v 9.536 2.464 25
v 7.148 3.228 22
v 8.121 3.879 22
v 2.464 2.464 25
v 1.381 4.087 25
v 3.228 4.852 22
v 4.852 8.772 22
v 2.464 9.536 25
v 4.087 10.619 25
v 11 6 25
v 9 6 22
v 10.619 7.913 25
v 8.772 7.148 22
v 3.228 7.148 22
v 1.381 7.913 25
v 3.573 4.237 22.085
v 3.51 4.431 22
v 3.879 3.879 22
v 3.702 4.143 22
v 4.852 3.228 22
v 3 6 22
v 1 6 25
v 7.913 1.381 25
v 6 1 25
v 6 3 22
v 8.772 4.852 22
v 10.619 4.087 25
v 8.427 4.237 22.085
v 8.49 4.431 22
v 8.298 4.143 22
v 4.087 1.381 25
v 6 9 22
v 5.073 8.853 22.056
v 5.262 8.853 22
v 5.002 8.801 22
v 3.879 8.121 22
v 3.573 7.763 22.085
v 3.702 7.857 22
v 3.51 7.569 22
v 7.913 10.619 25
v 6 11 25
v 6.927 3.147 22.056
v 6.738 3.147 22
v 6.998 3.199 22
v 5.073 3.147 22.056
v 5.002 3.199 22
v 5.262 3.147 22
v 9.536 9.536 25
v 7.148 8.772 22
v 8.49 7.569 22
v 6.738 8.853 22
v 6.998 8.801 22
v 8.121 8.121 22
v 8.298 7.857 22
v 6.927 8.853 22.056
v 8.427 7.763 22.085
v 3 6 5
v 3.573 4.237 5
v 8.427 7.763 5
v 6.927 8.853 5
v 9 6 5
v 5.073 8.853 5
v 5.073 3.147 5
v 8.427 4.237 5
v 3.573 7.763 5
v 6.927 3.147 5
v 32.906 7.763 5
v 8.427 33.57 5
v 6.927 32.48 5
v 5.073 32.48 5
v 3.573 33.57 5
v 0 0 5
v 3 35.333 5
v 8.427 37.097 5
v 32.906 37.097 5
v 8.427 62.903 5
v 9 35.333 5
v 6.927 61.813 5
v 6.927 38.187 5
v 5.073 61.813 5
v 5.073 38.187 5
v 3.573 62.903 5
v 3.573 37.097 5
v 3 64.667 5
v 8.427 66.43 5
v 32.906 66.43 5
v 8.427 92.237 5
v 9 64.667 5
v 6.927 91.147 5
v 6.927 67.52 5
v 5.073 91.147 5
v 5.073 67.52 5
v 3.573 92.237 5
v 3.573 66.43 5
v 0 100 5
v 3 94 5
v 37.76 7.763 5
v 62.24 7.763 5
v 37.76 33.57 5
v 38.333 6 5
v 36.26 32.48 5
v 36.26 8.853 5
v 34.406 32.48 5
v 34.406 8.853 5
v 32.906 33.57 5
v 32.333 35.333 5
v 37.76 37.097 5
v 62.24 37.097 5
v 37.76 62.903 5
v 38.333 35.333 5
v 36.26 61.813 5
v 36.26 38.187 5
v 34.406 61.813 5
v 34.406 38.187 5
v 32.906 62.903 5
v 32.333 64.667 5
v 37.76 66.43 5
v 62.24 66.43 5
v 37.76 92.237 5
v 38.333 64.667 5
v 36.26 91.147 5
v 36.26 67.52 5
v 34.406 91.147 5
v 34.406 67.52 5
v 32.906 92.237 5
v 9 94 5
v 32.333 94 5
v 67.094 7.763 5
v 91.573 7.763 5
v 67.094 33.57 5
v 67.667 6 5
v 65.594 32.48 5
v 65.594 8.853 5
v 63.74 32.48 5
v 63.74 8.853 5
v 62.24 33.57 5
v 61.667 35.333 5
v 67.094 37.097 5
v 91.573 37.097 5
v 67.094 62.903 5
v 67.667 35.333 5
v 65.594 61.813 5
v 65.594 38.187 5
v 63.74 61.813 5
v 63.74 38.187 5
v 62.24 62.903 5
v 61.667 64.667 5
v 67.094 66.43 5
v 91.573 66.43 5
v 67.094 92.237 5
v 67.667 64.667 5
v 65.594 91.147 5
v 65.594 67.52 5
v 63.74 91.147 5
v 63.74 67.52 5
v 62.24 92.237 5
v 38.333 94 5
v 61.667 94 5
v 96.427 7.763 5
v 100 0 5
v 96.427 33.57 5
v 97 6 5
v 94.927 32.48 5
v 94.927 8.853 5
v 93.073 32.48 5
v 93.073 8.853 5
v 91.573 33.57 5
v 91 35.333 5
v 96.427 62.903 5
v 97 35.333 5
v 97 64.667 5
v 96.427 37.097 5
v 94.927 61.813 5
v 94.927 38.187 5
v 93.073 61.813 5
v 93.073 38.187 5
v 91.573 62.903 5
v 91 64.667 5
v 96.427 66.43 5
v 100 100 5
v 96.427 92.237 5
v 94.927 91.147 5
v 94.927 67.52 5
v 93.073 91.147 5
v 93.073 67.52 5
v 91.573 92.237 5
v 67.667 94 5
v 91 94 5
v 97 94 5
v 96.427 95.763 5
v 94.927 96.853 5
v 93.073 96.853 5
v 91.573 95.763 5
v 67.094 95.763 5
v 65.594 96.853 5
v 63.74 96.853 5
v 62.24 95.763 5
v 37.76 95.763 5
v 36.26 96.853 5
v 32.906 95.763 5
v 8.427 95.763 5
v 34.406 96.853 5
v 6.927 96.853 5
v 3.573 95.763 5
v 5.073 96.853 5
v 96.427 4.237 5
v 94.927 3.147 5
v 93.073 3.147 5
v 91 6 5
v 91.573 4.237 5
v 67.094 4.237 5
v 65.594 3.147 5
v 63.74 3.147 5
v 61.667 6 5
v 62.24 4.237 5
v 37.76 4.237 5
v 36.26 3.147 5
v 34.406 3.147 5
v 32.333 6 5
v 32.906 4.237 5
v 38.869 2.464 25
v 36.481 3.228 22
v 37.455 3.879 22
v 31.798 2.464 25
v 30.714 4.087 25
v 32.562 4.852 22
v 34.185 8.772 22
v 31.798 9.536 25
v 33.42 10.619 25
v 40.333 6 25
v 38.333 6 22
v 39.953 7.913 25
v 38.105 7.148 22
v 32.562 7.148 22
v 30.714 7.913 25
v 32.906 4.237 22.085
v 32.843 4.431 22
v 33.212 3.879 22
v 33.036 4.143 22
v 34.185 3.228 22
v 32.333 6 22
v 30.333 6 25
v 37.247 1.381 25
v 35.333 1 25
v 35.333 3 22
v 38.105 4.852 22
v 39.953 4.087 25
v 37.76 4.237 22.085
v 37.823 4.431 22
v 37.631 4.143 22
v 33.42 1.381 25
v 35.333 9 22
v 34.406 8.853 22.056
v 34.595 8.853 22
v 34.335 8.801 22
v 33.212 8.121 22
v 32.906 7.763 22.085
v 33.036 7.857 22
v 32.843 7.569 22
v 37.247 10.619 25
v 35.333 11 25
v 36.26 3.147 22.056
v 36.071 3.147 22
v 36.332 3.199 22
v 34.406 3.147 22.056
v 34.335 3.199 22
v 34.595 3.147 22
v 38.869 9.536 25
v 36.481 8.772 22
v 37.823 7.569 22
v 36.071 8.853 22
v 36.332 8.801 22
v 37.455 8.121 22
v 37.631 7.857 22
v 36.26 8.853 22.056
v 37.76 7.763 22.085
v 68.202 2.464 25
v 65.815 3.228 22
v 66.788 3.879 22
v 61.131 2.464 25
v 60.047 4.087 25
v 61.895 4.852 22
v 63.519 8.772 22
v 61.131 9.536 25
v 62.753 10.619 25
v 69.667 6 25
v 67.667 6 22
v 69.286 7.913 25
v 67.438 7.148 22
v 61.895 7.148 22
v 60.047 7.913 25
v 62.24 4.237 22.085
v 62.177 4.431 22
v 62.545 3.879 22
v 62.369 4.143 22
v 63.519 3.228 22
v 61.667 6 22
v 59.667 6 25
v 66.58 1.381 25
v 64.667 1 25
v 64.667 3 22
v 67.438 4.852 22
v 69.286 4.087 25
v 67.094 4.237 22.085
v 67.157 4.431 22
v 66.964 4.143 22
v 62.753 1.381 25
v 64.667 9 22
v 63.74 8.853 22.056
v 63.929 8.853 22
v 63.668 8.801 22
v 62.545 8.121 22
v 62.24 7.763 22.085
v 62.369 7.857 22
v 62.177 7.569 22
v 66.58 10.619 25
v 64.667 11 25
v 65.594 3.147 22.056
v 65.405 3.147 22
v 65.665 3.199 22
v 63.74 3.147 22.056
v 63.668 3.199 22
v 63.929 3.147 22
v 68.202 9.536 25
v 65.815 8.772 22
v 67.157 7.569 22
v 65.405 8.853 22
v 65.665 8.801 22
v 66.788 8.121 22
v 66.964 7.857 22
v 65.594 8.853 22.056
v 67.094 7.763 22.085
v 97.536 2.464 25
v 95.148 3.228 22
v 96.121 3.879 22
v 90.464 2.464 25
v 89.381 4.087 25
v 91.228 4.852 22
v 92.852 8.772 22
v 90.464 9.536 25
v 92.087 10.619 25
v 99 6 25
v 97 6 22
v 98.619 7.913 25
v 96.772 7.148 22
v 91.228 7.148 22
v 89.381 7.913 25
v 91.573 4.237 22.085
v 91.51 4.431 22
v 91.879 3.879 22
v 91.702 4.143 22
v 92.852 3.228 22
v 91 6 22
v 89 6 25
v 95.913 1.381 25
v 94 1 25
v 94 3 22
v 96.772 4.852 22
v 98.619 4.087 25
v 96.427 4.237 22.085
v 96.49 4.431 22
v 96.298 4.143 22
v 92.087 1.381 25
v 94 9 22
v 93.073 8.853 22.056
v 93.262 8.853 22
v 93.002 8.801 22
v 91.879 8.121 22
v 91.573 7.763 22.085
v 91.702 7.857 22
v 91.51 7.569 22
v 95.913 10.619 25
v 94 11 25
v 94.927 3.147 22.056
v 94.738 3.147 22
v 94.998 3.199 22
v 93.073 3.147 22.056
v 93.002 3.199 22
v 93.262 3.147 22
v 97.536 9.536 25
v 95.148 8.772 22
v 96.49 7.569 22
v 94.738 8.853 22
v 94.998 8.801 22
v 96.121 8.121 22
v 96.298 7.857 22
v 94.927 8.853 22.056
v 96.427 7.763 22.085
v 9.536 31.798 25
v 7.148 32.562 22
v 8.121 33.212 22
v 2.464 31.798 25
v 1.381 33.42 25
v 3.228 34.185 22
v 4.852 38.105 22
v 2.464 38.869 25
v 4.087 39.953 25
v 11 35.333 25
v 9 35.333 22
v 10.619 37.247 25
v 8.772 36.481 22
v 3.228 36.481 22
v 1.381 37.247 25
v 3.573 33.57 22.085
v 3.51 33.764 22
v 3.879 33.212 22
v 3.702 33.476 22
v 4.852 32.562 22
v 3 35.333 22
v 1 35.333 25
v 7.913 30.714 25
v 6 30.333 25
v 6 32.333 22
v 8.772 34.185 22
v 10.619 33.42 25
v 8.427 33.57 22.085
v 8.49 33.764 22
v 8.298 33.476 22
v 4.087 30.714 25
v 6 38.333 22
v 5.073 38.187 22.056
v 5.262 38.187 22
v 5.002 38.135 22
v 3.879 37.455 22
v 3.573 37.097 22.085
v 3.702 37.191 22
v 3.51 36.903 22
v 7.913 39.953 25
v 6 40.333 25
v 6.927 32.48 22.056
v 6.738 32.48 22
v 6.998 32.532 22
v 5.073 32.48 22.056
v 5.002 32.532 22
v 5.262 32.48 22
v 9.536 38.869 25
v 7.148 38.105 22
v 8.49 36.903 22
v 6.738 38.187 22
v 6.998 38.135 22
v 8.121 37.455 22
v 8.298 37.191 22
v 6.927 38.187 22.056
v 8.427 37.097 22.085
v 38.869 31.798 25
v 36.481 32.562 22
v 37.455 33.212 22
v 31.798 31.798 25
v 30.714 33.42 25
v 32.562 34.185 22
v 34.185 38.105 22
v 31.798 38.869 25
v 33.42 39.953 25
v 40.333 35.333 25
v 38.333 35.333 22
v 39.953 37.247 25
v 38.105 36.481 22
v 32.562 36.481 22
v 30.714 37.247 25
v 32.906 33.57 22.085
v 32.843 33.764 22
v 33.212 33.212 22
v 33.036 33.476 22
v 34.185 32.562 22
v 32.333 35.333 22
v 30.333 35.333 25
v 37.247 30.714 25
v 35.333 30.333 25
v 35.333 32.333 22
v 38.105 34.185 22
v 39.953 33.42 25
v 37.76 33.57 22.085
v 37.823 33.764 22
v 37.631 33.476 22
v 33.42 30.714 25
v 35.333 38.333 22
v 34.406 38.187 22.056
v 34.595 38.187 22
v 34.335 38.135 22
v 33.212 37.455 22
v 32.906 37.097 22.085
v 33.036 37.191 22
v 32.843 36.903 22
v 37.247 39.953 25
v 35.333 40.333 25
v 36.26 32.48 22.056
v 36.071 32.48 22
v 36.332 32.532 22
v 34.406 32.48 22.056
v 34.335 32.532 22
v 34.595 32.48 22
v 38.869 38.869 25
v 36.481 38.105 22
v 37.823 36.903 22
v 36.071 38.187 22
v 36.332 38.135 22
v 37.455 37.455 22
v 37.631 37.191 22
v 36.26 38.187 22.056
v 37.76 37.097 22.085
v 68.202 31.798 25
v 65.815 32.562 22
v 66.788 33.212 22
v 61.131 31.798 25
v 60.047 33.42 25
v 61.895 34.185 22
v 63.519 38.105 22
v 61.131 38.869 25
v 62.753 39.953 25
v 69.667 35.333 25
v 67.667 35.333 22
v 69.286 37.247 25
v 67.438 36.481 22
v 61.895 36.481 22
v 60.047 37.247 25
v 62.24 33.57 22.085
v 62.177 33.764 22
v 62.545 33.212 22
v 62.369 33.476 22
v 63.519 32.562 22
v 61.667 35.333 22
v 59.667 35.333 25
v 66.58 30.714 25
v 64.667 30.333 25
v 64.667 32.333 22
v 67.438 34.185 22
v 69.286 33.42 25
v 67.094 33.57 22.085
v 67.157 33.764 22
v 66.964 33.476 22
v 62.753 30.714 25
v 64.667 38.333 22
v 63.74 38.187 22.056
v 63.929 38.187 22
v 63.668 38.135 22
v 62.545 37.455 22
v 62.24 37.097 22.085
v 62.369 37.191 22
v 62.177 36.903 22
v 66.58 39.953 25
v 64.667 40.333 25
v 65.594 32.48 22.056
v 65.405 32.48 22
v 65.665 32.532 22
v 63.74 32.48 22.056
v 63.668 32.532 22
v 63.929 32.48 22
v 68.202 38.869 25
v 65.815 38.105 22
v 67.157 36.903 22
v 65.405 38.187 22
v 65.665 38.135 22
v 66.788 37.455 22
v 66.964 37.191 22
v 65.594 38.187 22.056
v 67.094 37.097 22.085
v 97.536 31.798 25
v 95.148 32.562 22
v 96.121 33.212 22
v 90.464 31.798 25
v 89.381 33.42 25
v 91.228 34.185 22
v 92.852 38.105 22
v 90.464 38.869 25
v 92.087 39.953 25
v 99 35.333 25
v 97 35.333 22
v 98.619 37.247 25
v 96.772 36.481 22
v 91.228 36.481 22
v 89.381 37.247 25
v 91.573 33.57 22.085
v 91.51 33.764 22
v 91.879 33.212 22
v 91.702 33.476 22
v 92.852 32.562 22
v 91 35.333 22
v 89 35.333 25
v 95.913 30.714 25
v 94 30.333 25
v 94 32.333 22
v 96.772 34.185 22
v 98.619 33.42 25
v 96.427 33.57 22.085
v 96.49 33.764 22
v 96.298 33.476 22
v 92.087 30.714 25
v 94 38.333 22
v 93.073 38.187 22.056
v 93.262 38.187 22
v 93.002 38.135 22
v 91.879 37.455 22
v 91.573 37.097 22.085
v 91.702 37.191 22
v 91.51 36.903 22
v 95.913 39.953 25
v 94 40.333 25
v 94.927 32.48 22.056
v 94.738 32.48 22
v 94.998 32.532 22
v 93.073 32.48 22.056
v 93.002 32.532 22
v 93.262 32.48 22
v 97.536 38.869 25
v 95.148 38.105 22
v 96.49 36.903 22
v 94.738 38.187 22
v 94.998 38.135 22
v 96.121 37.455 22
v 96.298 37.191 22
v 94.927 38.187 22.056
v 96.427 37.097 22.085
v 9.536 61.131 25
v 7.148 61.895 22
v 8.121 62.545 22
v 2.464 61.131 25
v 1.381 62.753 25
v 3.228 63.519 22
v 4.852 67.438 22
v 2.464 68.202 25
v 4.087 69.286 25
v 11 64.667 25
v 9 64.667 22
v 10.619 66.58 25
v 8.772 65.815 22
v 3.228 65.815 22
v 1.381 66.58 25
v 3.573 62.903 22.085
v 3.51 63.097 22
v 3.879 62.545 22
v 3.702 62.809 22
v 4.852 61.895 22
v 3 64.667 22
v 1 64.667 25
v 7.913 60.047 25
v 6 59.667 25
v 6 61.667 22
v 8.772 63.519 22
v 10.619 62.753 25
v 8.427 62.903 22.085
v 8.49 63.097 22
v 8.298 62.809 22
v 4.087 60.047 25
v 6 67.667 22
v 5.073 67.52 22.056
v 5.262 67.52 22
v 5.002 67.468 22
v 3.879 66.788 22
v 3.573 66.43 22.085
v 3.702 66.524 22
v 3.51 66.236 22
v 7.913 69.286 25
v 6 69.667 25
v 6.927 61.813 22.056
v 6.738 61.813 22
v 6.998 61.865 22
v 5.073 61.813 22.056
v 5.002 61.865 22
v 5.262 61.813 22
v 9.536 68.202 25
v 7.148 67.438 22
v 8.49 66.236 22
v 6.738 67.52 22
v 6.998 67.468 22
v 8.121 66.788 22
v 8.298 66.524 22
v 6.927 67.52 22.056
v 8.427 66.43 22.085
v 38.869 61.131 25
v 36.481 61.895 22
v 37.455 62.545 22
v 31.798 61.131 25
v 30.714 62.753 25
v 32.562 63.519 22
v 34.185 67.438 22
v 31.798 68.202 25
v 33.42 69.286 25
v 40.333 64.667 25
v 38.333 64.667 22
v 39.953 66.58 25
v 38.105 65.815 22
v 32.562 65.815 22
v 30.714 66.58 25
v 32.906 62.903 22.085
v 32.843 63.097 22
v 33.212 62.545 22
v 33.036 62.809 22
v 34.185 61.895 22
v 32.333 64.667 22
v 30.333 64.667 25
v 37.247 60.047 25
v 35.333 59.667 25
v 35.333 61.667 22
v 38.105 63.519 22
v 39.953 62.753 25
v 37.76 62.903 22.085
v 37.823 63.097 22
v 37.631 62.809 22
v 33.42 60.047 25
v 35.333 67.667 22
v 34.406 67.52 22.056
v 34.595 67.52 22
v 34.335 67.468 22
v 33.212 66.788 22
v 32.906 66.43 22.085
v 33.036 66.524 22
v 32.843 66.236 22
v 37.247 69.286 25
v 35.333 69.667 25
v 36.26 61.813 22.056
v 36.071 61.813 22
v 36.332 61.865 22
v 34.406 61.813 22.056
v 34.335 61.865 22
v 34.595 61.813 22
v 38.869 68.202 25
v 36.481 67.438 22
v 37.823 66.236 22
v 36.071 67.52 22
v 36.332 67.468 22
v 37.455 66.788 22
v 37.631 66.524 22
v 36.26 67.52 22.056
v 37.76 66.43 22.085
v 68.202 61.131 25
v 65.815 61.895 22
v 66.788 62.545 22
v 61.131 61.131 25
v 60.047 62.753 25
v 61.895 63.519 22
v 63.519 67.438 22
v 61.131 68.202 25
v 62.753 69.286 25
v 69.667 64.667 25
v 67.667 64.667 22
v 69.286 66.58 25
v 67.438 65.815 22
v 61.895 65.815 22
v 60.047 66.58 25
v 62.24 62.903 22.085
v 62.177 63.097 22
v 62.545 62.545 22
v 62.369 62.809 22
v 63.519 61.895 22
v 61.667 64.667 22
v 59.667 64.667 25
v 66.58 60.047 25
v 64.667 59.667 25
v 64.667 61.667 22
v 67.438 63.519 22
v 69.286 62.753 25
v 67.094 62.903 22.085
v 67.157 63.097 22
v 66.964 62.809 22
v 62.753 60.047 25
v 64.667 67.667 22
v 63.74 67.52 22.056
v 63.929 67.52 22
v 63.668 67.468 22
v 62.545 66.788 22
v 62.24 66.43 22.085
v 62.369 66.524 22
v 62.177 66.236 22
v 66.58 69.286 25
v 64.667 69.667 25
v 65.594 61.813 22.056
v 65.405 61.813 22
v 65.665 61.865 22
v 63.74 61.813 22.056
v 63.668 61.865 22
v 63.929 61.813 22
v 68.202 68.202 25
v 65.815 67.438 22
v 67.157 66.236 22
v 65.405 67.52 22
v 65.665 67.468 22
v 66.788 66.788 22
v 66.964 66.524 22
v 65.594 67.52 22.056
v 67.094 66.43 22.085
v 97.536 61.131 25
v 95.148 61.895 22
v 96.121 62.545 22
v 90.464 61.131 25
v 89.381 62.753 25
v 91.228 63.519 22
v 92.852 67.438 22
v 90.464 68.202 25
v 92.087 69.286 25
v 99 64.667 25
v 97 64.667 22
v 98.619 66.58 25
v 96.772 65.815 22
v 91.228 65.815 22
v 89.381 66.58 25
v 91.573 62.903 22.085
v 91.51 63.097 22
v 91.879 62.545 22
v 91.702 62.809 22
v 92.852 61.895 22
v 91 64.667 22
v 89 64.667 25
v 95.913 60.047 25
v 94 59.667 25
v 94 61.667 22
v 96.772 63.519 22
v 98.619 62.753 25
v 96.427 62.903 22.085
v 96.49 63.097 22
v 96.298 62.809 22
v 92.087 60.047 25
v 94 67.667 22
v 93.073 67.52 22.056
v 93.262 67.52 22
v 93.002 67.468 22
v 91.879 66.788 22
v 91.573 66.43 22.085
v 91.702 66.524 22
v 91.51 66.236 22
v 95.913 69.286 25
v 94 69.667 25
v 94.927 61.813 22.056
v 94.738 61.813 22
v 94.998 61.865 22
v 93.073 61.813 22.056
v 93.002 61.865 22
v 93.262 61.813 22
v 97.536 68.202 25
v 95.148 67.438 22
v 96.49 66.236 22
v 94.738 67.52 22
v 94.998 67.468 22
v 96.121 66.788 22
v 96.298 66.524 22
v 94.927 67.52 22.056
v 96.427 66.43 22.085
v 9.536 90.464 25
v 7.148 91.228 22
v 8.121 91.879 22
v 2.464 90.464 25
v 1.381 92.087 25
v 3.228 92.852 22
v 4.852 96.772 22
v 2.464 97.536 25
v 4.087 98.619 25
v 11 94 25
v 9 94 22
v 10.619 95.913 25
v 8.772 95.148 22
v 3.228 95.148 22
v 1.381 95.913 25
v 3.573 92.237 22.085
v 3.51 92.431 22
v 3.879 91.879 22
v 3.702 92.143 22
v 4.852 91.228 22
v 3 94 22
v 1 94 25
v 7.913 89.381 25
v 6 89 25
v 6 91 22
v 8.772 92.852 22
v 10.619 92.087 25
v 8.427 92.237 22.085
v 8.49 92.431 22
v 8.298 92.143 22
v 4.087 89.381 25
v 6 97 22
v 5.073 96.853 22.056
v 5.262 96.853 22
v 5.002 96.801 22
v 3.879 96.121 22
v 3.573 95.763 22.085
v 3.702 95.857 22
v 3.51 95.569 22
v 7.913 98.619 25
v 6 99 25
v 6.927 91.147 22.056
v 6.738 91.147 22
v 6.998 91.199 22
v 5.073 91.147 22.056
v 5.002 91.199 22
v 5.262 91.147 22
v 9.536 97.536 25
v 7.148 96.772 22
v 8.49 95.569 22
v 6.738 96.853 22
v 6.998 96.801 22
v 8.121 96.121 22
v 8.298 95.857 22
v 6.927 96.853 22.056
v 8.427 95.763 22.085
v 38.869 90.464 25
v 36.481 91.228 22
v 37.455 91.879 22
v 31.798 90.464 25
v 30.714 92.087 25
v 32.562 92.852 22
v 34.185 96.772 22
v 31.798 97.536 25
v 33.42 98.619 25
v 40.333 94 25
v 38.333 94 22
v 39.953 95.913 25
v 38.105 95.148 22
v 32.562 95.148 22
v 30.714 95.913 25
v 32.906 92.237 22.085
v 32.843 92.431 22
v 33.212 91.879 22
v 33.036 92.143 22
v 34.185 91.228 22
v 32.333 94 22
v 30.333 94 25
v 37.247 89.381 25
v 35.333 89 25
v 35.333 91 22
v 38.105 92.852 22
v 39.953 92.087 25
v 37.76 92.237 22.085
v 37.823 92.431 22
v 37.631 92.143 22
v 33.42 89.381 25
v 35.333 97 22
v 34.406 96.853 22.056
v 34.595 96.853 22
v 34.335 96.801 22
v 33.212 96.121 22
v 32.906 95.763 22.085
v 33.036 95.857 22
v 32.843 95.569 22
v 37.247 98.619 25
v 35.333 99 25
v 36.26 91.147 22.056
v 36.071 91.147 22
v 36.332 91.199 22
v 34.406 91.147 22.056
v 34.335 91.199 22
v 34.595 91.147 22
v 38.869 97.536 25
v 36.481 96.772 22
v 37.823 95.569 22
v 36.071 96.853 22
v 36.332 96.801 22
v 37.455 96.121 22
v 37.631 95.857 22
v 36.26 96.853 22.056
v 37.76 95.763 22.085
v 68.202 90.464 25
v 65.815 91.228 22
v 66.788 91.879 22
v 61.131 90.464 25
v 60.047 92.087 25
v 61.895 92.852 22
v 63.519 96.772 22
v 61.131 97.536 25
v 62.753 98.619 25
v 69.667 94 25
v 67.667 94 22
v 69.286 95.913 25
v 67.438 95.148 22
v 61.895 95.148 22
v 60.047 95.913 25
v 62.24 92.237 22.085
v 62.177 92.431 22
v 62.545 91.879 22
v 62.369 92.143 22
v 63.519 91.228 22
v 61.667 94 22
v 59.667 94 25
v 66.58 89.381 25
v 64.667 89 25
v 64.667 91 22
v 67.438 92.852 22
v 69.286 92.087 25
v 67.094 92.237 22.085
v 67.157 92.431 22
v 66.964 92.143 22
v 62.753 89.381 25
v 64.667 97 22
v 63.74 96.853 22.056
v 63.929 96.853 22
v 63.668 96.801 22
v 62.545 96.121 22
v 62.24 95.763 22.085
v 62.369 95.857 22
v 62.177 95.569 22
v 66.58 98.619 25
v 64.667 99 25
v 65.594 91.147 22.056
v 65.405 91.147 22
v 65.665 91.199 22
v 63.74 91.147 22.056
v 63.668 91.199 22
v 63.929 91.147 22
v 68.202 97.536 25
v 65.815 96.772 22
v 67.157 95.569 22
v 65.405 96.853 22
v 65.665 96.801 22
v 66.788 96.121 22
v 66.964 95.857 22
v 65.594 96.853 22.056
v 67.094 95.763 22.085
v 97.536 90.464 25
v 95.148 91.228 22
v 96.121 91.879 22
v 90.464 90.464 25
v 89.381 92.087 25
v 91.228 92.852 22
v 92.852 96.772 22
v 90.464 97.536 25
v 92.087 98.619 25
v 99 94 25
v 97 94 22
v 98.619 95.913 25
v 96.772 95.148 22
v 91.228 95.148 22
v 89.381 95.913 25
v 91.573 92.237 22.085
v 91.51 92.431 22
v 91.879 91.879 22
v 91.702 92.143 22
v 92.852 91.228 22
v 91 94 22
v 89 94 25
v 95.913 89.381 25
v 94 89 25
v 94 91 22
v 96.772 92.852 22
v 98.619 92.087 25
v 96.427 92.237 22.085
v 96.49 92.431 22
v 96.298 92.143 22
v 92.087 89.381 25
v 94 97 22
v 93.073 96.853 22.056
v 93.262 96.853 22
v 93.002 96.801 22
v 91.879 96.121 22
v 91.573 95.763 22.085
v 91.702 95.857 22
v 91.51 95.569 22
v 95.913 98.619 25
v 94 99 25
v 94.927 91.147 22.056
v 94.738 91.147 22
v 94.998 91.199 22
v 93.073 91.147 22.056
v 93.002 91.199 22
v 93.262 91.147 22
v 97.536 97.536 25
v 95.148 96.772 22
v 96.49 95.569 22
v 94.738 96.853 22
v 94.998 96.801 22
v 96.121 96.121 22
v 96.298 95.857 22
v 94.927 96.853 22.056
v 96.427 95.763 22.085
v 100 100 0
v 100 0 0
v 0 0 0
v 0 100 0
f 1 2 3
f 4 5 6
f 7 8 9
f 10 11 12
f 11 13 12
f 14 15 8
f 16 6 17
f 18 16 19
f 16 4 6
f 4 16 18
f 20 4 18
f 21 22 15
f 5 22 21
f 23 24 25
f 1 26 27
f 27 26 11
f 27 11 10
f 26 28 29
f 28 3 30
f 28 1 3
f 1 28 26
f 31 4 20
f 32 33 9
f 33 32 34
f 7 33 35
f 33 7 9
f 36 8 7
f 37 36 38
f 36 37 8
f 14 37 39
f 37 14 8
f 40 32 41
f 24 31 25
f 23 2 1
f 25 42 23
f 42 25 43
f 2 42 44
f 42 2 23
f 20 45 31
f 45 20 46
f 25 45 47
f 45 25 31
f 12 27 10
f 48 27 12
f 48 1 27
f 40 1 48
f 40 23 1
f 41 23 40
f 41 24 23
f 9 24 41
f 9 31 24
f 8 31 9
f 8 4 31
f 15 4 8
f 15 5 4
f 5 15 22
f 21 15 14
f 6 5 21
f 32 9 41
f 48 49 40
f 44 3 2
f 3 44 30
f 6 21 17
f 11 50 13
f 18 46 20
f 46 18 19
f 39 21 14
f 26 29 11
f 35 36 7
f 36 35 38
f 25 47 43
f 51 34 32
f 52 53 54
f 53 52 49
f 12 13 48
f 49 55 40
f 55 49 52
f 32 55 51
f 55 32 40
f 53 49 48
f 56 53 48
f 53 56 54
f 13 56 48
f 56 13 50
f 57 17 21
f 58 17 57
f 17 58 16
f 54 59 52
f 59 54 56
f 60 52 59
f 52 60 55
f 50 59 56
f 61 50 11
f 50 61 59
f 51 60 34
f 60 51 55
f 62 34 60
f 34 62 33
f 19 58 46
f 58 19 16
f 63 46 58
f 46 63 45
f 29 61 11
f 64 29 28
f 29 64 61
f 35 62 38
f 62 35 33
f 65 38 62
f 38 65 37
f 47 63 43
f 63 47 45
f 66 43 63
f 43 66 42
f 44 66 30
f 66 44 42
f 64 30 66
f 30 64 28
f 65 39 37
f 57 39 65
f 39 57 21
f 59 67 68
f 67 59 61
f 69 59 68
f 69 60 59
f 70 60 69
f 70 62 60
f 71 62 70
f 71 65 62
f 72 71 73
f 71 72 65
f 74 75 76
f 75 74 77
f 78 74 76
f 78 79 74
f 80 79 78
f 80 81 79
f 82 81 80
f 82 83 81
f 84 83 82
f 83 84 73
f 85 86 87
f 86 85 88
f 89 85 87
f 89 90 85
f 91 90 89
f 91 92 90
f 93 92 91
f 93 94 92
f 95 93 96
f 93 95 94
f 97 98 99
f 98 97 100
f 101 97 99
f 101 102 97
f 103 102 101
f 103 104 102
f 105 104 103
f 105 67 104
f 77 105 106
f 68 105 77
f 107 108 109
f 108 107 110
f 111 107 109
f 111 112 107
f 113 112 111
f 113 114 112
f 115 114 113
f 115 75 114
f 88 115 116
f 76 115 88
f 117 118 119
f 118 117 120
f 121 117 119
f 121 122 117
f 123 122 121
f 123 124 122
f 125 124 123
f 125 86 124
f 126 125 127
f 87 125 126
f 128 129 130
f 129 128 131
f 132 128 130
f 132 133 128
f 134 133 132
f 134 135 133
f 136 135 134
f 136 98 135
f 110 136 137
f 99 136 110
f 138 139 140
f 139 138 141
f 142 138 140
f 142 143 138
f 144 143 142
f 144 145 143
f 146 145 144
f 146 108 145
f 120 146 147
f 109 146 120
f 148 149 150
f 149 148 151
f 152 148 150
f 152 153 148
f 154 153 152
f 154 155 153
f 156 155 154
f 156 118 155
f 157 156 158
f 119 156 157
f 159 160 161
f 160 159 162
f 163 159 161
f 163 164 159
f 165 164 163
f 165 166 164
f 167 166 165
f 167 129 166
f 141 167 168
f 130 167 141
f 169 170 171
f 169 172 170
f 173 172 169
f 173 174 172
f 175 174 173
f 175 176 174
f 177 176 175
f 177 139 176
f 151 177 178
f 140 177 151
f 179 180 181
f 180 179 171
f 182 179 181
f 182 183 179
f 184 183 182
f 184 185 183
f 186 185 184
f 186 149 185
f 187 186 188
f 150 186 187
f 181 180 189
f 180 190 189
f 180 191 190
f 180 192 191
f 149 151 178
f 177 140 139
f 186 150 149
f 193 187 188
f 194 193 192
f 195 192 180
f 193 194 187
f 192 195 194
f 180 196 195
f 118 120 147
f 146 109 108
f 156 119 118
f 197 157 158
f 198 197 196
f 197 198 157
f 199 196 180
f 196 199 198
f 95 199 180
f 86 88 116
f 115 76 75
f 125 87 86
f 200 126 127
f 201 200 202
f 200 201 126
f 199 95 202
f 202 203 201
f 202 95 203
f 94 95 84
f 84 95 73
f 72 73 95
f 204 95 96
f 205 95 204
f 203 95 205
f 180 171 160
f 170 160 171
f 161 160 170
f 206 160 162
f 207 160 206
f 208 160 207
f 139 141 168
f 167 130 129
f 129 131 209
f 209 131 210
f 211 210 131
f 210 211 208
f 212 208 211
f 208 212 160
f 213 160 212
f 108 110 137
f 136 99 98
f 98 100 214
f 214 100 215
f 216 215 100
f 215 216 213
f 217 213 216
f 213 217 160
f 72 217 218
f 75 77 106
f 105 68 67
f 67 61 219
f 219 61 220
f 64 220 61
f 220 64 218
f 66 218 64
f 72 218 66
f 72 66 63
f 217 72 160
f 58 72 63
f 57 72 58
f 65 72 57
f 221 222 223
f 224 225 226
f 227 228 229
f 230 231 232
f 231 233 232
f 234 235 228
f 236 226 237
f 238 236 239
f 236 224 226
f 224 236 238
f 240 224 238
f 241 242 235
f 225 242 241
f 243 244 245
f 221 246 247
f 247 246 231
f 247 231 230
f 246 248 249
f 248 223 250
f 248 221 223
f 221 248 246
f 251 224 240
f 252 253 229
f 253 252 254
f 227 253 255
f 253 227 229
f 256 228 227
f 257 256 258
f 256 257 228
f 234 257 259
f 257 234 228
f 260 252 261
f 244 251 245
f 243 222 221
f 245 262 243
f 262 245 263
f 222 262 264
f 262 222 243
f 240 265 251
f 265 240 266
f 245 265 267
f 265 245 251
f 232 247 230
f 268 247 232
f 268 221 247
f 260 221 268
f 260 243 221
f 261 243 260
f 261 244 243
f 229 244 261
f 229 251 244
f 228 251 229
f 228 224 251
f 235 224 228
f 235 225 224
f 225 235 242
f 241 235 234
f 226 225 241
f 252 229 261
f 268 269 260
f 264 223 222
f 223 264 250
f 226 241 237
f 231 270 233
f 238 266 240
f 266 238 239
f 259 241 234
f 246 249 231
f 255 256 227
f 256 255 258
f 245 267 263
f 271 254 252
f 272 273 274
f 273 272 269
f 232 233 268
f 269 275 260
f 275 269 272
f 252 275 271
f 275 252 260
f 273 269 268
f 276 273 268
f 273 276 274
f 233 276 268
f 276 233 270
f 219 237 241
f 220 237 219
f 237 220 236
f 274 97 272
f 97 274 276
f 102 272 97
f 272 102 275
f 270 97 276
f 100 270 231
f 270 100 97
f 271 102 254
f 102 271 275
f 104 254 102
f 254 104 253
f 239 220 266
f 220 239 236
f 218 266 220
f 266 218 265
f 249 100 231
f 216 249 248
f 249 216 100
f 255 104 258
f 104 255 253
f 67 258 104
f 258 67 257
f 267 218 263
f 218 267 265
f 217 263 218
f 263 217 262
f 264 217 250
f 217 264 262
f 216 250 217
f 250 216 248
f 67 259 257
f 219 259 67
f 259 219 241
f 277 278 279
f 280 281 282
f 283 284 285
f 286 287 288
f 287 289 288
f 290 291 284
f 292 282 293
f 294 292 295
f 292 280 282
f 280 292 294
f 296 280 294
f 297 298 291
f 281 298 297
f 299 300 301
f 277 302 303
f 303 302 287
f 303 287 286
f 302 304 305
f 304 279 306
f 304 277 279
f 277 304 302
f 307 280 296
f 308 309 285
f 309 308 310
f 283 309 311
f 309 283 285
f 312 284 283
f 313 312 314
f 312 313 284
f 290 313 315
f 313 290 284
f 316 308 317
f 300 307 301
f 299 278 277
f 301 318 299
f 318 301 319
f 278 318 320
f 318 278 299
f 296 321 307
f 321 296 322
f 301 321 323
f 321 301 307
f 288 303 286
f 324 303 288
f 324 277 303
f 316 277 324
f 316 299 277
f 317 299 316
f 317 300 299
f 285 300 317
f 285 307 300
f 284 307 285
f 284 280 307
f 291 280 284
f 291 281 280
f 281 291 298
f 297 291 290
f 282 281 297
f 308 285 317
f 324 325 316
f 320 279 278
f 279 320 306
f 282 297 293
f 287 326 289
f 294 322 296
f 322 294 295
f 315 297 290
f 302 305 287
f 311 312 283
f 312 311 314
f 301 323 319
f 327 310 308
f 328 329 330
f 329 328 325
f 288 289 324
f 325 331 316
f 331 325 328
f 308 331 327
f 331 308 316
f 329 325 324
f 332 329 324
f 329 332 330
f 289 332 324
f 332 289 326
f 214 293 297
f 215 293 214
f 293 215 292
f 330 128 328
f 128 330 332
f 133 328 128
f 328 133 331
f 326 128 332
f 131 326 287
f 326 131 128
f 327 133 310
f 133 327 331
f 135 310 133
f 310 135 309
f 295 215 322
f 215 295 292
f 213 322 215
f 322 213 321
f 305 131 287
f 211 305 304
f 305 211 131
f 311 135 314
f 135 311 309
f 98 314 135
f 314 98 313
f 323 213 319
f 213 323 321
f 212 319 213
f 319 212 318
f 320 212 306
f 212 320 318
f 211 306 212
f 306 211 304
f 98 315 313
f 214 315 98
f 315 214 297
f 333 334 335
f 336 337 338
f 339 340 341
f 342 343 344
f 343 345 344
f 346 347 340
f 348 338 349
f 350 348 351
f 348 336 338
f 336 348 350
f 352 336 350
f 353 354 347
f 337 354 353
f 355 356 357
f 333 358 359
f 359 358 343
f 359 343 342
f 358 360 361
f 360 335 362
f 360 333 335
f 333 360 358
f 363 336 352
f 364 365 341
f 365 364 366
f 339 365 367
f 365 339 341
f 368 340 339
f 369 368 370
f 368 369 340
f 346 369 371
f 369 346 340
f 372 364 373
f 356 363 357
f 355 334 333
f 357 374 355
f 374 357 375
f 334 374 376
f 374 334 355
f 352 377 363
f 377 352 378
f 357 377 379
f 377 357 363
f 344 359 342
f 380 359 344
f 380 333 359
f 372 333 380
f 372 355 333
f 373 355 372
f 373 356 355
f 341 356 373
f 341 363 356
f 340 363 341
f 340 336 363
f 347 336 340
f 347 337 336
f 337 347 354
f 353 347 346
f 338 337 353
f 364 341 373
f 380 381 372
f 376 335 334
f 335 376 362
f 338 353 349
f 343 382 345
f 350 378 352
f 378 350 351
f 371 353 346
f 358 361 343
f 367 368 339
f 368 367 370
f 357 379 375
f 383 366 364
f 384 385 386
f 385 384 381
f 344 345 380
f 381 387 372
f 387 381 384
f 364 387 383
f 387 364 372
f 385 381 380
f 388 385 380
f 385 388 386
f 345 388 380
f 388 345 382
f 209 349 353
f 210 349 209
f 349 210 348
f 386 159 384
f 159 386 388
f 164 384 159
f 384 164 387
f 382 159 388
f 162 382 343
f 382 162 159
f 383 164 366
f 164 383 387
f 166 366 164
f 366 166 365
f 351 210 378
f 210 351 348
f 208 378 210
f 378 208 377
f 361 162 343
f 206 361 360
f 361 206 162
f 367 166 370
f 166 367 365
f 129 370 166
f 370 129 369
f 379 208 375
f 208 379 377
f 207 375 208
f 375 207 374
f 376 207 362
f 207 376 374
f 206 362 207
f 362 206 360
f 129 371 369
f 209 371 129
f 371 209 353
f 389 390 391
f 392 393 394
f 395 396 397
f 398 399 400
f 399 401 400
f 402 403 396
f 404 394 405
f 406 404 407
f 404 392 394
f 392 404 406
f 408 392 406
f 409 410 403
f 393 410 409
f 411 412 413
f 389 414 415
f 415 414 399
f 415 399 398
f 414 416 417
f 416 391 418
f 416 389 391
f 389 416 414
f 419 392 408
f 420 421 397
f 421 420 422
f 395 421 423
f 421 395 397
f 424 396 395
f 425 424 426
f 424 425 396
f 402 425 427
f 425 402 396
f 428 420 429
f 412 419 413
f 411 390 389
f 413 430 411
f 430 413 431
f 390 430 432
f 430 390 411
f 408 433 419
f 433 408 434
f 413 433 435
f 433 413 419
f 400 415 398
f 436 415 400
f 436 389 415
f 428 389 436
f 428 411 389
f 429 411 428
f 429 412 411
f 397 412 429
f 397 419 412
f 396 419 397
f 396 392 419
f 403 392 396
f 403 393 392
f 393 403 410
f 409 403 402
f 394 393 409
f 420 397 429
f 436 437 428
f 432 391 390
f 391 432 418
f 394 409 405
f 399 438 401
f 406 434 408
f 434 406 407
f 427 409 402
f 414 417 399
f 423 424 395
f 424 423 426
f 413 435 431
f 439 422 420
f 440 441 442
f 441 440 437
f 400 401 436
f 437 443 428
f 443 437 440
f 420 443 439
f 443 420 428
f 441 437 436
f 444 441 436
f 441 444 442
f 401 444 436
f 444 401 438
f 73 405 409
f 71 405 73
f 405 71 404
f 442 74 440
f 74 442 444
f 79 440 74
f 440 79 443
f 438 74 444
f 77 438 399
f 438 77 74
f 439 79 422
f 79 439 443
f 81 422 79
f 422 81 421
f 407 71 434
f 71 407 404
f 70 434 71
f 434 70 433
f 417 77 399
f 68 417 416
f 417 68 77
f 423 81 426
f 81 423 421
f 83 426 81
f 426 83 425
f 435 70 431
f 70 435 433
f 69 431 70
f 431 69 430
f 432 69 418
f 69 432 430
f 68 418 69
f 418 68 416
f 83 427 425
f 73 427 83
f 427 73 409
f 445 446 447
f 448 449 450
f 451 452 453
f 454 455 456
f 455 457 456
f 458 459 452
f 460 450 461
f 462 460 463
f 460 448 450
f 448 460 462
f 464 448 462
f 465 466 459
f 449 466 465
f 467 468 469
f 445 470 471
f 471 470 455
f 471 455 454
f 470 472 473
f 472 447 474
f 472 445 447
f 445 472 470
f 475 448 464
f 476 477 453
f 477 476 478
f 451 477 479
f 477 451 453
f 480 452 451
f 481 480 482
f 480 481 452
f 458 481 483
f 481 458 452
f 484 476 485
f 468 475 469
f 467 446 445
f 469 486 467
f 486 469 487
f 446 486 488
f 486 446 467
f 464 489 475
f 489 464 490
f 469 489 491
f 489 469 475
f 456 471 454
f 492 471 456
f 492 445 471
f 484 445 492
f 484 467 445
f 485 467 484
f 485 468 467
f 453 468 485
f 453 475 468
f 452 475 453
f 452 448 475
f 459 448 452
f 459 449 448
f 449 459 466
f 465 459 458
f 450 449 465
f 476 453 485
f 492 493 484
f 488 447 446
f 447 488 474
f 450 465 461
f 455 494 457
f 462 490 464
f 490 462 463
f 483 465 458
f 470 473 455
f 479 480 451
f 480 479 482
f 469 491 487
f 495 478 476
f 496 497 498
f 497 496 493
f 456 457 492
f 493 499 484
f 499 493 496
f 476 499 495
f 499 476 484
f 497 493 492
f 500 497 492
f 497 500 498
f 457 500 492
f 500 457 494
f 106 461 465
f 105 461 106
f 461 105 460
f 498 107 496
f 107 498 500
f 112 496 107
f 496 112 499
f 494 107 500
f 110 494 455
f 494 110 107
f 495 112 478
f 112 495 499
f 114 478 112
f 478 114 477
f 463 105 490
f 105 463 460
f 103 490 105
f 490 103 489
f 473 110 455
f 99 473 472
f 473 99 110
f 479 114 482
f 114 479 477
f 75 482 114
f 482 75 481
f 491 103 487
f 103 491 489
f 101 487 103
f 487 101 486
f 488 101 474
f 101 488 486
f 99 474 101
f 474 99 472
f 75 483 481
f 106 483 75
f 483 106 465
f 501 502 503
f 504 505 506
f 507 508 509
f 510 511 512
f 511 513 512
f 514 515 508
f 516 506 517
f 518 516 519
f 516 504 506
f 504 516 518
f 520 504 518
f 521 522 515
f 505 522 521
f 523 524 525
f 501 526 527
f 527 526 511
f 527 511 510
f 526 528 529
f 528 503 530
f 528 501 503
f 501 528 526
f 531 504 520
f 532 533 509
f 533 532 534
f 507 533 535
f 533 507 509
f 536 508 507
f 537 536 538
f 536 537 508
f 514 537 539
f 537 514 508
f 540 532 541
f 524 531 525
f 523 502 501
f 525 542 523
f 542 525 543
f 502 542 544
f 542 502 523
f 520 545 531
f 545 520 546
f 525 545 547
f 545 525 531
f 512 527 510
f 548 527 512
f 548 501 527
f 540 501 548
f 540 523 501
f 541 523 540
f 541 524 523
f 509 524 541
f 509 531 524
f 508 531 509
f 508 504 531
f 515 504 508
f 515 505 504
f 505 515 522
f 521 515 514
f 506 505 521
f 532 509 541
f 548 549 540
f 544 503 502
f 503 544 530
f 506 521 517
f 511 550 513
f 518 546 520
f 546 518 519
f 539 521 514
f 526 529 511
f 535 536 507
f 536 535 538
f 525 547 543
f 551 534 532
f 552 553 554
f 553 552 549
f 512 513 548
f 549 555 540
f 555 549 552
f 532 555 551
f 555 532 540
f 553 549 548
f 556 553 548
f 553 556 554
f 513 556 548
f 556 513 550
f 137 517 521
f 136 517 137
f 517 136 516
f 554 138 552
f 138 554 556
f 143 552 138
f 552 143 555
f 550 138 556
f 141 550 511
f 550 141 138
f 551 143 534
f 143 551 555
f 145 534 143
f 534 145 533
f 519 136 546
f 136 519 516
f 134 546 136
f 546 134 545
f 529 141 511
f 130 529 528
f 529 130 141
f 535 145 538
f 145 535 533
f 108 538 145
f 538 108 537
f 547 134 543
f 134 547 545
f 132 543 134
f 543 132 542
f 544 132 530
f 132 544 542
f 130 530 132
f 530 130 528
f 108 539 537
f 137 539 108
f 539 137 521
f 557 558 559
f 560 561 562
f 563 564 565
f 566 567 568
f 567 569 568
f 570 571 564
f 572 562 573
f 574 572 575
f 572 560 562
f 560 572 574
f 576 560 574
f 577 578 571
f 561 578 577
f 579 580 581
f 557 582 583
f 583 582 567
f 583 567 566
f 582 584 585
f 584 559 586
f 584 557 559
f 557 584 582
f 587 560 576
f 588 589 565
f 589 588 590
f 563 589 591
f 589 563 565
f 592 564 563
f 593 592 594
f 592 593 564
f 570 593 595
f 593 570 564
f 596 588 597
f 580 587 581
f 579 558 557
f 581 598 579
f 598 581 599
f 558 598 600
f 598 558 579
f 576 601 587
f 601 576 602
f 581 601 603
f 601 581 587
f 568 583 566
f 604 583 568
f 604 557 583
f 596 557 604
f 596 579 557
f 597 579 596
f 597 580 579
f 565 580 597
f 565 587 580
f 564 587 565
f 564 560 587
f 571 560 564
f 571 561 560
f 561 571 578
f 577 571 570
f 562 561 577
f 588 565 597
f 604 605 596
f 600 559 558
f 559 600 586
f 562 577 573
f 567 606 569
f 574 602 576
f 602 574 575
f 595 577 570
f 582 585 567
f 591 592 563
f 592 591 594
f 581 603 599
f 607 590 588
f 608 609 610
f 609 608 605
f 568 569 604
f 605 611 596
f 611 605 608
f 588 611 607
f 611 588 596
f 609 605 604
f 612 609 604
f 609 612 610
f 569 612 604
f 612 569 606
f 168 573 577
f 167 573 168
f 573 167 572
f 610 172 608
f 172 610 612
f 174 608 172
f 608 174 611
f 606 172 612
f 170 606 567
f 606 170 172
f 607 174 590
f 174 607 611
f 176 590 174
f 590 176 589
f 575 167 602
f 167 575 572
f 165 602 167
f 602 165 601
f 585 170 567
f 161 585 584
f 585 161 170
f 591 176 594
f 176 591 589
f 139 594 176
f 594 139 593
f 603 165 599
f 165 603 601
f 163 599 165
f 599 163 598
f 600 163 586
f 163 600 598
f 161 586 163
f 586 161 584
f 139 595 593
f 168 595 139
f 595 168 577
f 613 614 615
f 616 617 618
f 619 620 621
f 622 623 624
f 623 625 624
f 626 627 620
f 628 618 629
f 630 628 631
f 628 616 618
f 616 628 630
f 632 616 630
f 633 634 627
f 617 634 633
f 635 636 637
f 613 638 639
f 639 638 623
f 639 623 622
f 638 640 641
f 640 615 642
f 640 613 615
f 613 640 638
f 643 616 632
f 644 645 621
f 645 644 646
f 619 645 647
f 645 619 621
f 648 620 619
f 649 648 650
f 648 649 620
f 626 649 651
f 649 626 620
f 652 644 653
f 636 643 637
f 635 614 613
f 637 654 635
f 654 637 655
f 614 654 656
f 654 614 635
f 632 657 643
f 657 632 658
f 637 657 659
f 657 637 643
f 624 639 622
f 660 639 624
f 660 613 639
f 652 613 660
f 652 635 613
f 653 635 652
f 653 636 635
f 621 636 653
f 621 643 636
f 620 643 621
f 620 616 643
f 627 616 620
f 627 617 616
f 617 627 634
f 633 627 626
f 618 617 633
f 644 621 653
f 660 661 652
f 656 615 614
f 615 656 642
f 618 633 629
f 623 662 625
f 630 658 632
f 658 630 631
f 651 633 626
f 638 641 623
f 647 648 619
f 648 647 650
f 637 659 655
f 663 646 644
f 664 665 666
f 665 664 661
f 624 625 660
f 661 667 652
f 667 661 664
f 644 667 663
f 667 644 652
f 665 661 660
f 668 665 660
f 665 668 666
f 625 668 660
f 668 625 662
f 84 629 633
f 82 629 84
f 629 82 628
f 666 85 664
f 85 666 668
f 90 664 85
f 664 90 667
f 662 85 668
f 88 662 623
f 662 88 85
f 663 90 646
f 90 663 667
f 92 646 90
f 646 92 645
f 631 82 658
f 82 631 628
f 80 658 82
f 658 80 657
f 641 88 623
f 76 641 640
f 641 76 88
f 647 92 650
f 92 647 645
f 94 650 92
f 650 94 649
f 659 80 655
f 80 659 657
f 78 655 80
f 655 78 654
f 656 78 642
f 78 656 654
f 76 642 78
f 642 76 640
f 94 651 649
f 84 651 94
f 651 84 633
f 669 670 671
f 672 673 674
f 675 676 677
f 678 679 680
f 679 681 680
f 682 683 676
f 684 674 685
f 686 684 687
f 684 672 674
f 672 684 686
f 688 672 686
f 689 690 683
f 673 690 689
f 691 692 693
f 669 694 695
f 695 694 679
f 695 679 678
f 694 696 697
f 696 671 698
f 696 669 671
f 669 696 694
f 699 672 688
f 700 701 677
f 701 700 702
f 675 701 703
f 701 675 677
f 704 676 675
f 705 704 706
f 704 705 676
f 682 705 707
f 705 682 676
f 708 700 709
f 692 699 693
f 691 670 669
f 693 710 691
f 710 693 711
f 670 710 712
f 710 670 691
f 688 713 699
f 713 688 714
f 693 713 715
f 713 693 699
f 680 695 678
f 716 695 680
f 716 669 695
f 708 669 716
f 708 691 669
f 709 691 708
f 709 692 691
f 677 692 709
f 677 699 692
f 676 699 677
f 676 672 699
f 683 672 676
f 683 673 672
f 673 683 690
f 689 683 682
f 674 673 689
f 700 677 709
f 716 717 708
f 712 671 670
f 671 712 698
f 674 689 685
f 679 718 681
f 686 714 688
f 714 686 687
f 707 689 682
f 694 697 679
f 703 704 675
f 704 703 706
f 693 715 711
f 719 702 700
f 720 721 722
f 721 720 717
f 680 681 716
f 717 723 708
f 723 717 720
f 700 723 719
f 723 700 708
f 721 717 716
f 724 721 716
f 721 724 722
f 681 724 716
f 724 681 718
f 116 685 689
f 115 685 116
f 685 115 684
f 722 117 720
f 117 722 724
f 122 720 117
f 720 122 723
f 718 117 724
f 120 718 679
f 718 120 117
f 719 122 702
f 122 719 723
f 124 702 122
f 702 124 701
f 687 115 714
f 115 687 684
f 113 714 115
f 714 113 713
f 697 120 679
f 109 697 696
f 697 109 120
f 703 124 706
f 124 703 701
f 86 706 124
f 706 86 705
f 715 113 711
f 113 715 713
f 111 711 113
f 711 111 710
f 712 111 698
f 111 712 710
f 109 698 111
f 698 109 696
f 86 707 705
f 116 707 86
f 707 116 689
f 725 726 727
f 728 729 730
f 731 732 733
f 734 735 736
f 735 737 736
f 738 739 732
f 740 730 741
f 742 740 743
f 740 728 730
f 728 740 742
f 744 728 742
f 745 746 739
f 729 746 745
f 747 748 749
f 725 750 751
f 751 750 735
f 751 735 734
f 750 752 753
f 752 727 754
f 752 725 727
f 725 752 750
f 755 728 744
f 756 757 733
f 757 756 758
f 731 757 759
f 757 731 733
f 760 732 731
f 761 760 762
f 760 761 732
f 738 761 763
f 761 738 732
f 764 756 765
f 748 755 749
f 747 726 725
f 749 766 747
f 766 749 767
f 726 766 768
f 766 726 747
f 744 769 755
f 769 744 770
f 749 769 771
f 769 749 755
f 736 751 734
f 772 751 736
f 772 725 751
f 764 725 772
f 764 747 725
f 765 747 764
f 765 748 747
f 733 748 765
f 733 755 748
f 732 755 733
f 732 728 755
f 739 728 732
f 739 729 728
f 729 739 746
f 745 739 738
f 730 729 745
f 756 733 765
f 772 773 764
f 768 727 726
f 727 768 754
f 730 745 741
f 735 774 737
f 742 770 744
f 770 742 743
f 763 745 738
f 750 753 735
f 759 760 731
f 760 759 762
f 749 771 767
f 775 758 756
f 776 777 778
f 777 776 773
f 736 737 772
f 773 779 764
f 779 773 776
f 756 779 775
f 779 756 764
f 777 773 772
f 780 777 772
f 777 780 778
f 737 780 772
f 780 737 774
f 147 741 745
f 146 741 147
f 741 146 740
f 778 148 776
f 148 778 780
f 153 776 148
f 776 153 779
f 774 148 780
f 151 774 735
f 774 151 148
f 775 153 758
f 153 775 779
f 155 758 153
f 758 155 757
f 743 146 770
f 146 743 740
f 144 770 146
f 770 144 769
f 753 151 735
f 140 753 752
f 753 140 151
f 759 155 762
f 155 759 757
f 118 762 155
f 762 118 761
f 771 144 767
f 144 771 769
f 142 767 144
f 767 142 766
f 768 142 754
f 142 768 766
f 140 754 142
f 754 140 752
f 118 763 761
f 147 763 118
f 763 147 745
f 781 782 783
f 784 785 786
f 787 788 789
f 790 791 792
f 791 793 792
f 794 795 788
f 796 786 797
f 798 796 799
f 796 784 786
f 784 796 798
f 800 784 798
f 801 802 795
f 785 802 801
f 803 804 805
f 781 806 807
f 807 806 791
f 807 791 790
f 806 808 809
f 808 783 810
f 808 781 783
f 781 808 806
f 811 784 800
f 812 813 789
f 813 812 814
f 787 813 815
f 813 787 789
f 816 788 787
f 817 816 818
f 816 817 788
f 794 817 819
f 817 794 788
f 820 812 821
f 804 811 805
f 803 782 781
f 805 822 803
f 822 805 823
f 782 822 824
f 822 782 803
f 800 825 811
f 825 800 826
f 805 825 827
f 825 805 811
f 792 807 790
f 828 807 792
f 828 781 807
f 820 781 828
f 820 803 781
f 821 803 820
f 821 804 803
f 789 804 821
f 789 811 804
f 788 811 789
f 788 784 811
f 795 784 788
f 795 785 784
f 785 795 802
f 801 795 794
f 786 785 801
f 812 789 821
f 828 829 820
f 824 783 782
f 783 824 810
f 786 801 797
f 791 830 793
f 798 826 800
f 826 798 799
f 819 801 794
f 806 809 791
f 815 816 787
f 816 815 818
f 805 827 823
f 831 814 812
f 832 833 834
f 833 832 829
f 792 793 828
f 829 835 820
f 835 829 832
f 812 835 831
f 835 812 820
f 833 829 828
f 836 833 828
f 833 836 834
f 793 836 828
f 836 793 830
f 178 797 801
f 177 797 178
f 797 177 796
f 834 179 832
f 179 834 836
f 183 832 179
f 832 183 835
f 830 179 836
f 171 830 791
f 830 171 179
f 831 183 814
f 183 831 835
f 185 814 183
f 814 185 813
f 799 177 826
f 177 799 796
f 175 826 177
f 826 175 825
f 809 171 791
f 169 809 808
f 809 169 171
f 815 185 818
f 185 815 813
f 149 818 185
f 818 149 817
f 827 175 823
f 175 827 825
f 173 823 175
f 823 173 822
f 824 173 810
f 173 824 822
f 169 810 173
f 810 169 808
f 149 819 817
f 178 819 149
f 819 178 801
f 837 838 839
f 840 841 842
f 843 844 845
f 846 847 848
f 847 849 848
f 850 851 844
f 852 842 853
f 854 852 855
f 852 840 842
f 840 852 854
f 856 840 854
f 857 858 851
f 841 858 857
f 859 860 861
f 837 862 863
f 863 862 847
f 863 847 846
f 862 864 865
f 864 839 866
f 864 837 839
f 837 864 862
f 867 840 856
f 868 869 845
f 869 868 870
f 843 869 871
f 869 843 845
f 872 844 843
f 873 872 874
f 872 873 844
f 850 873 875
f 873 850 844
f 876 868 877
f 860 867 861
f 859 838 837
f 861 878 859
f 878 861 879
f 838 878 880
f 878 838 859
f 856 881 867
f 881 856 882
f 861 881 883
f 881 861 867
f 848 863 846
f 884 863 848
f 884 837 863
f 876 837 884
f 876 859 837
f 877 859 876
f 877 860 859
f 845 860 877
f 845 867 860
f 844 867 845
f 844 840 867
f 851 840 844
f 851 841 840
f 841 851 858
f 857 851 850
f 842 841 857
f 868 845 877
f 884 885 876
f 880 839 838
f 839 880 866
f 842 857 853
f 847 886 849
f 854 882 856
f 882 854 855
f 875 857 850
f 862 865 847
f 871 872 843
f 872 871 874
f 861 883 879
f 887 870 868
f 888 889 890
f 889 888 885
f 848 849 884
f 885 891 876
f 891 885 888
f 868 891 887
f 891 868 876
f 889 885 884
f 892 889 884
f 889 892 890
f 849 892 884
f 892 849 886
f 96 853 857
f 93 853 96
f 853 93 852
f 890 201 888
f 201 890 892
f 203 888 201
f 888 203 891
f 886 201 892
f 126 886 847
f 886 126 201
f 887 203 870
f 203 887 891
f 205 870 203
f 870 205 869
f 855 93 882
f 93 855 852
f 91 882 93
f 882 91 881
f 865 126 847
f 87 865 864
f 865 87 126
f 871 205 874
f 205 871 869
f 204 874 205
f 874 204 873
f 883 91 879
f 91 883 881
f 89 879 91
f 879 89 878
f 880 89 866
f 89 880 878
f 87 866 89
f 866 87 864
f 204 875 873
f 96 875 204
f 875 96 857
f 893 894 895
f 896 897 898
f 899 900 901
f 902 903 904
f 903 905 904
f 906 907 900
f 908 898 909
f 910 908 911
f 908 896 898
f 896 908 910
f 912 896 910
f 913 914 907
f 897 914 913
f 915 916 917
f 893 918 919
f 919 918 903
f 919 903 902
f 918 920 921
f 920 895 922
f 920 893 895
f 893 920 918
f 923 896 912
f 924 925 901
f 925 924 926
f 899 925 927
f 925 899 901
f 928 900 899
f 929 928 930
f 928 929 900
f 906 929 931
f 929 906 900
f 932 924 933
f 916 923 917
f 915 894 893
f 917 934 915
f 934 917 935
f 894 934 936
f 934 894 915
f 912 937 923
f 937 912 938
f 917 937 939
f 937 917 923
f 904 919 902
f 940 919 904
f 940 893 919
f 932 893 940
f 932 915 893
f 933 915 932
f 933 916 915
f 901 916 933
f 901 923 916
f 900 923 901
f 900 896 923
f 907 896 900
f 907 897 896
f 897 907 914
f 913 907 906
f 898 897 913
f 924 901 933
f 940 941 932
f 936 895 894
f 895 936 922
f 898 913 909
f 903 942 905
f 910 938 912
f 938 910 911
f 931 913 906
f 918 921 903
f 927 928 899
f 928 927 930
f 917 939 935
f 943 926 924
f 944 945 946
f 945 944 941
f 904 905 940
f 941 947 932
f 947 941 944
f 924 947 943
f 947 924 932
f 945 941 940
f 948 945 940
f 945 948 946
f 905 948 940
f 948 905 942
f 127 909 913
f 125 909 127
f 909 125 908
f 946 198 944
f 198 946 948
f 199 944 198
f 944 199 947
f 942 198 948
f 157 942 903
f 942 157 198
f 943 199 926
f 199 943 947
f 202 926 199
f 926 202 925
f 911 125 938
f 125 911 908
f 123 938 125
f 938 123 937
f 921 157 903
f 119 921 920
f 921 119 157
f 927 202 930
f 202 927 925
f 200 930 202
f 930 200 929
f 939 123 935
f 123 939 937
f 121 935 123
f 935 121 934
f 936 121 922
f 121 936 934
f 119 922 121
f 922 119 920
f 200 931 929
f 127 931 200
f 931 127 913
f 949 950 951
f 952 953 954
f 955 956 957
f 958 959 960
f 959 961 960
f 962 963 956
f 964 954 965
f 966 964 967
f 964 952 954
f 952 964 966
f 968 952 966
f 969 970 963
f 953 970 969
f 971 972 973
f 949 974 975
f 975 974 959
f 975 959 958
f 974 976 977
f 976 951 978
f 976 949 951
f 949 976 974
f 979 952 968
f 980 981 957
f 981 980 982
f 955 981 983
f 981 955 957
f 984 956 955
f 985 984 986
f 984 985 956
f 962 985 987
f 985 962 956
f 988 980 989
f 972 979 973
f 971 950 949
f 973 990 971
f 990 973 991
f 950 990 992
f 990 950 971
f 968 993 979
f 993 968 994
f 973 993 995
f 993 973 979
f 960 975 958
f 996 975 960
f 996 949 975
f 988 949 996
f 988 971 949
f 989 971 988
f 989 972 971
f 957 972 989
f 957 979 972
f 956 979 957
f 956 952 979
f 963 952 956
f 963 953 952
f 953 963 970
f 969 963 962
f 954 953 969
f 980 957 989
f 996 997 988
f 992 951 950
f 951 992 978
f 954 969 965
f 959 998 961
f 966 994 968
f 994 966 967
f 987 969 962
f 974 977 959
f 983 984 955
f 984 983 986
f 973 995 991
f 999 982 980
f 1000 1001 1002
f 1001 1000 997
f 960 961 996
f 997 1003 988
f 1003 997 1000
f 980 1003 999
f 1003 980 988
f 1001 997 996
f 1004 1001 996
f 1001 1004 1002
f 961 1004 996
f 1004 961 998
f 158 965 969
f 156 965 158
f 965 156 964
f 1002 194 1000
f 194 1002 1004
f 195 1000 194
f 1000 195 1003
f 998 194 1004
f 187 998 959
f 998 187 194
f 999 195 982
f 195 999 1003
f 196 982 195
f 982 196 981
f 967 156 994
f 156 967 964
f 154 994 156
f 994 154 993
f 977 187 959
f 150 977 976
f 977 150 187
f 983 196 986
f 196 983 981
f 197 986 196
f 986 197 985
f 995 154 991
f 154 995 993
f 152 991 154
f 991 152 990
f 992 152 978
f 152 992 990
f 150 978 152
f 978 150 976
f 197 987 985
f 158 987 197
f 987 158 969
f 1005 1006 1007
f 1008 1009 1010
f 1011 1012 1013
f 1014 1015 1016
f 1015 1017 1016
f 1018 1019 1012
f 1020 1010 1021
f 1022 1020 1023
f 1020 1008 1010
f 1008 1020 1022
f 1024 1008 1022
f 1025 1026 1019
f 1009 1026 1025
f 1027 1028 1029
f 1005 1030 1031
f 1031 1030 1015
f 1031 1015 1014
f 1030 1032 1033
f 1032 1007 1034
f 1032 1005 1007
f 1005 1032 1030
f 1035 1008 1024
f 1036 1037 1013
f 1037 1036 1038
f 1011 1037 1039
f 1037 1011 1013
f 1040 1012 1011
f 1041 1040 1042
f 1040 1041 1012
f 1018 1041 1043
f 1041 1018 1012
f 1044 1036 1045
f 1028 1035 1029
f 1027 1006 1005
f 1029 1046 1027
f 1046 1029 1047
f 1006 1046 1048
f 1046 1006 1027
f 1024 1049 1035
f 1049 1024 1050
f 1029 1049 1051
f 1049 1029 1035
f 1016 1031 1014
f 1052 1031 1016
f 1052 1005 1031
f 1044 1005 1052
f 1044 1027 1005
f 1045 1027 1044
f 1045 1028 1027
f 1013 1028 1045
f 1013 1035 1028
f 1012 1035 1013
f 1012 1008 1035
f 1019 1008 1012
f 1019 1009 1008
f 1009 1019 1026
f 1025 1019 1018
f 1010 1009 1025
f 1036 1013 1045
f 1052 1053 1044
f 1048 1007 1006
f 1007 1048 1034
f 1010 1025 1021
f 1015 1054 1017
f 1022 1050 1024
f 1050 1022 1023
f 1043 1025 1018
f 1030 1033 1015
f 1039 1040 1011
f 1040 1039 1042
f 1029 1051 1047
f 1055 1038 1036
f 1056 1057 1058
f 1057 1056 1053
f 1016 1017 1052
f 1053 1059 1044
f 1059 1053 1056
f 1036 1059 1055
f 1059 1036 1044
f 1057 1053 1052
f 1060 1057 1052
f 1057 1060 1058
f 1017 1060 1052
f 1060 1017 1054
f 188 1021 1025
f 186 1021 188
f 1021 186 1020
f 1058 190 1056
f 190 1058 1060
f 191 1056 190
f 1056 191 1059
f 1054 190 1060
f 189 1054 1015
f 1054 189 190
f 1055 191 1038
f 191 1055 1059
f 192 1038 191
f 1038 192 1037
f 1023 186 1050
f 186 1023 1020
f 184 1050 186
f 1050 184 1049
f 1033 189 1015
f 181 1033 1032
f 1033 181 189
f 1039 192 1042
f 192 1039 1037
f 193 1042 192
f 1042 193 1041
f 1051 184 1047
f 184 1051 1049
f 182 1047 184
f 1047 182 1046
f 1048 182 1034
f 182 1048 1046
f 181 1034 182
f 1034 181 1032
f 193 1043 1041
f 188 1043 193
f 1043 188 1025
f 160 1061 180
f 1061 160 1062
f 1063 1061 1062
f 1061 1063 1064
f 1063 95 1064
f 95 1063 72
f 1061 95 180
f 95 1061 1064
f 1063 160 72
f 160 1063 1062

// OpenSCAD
// [FL_INDEX: keywords="openscad, 3d_parametric, Updated_Fully_Customizable_Geoboard, csg_solid" | COT="Parametric OpenSCAD design from 3DCodeverse"]
// Title: Updated Fully Customizable Geoboard

//This creates a customizable square geoboard. Everything I could think of is customizable.

//Size of base
base_size = 100; // [10:500]

//Thickness of base
base_thickness = 5;

//Peg thickness
peg_thickness = 3; // [1:10]

//Peg height
peg_height = 20; // [10:50]

//Number of pegs on X axis
X_pegs = 4;

//Number of pegs on Y axis
Y_pegs = 4;

//Width of step on top of peg
step_width = 2; // [0:5]

//% of peg height for step
step_percent = 15; // [5:90]

module peg()
{
translate([0,0,(peg_height+base_thickness)-peg_height*(step_percent/100)])cylinder(peg_height*(step_percent/100),peg_thickness,peg_thickness+step_width);
translate([0,0,base_thickness])cylinder(peg_height,peg_thickness,peg_thickness);
}
cube([base_size,base_size,base_thickness]);

module peg_line()
{
for (i = [0 : X_pegs-1] ){
translate([((base_size-peg_thickness*4)/(X_pegs-1))*(i)+peg_thickness*2,peg_thickness*2,0]) peg();
}
}

for (i = [0 : Y_pegs-1] ){
translate([0,((base_size-peg_thickness*4)/(Y_pegs-1))*(i),0]) peg_line();
}
